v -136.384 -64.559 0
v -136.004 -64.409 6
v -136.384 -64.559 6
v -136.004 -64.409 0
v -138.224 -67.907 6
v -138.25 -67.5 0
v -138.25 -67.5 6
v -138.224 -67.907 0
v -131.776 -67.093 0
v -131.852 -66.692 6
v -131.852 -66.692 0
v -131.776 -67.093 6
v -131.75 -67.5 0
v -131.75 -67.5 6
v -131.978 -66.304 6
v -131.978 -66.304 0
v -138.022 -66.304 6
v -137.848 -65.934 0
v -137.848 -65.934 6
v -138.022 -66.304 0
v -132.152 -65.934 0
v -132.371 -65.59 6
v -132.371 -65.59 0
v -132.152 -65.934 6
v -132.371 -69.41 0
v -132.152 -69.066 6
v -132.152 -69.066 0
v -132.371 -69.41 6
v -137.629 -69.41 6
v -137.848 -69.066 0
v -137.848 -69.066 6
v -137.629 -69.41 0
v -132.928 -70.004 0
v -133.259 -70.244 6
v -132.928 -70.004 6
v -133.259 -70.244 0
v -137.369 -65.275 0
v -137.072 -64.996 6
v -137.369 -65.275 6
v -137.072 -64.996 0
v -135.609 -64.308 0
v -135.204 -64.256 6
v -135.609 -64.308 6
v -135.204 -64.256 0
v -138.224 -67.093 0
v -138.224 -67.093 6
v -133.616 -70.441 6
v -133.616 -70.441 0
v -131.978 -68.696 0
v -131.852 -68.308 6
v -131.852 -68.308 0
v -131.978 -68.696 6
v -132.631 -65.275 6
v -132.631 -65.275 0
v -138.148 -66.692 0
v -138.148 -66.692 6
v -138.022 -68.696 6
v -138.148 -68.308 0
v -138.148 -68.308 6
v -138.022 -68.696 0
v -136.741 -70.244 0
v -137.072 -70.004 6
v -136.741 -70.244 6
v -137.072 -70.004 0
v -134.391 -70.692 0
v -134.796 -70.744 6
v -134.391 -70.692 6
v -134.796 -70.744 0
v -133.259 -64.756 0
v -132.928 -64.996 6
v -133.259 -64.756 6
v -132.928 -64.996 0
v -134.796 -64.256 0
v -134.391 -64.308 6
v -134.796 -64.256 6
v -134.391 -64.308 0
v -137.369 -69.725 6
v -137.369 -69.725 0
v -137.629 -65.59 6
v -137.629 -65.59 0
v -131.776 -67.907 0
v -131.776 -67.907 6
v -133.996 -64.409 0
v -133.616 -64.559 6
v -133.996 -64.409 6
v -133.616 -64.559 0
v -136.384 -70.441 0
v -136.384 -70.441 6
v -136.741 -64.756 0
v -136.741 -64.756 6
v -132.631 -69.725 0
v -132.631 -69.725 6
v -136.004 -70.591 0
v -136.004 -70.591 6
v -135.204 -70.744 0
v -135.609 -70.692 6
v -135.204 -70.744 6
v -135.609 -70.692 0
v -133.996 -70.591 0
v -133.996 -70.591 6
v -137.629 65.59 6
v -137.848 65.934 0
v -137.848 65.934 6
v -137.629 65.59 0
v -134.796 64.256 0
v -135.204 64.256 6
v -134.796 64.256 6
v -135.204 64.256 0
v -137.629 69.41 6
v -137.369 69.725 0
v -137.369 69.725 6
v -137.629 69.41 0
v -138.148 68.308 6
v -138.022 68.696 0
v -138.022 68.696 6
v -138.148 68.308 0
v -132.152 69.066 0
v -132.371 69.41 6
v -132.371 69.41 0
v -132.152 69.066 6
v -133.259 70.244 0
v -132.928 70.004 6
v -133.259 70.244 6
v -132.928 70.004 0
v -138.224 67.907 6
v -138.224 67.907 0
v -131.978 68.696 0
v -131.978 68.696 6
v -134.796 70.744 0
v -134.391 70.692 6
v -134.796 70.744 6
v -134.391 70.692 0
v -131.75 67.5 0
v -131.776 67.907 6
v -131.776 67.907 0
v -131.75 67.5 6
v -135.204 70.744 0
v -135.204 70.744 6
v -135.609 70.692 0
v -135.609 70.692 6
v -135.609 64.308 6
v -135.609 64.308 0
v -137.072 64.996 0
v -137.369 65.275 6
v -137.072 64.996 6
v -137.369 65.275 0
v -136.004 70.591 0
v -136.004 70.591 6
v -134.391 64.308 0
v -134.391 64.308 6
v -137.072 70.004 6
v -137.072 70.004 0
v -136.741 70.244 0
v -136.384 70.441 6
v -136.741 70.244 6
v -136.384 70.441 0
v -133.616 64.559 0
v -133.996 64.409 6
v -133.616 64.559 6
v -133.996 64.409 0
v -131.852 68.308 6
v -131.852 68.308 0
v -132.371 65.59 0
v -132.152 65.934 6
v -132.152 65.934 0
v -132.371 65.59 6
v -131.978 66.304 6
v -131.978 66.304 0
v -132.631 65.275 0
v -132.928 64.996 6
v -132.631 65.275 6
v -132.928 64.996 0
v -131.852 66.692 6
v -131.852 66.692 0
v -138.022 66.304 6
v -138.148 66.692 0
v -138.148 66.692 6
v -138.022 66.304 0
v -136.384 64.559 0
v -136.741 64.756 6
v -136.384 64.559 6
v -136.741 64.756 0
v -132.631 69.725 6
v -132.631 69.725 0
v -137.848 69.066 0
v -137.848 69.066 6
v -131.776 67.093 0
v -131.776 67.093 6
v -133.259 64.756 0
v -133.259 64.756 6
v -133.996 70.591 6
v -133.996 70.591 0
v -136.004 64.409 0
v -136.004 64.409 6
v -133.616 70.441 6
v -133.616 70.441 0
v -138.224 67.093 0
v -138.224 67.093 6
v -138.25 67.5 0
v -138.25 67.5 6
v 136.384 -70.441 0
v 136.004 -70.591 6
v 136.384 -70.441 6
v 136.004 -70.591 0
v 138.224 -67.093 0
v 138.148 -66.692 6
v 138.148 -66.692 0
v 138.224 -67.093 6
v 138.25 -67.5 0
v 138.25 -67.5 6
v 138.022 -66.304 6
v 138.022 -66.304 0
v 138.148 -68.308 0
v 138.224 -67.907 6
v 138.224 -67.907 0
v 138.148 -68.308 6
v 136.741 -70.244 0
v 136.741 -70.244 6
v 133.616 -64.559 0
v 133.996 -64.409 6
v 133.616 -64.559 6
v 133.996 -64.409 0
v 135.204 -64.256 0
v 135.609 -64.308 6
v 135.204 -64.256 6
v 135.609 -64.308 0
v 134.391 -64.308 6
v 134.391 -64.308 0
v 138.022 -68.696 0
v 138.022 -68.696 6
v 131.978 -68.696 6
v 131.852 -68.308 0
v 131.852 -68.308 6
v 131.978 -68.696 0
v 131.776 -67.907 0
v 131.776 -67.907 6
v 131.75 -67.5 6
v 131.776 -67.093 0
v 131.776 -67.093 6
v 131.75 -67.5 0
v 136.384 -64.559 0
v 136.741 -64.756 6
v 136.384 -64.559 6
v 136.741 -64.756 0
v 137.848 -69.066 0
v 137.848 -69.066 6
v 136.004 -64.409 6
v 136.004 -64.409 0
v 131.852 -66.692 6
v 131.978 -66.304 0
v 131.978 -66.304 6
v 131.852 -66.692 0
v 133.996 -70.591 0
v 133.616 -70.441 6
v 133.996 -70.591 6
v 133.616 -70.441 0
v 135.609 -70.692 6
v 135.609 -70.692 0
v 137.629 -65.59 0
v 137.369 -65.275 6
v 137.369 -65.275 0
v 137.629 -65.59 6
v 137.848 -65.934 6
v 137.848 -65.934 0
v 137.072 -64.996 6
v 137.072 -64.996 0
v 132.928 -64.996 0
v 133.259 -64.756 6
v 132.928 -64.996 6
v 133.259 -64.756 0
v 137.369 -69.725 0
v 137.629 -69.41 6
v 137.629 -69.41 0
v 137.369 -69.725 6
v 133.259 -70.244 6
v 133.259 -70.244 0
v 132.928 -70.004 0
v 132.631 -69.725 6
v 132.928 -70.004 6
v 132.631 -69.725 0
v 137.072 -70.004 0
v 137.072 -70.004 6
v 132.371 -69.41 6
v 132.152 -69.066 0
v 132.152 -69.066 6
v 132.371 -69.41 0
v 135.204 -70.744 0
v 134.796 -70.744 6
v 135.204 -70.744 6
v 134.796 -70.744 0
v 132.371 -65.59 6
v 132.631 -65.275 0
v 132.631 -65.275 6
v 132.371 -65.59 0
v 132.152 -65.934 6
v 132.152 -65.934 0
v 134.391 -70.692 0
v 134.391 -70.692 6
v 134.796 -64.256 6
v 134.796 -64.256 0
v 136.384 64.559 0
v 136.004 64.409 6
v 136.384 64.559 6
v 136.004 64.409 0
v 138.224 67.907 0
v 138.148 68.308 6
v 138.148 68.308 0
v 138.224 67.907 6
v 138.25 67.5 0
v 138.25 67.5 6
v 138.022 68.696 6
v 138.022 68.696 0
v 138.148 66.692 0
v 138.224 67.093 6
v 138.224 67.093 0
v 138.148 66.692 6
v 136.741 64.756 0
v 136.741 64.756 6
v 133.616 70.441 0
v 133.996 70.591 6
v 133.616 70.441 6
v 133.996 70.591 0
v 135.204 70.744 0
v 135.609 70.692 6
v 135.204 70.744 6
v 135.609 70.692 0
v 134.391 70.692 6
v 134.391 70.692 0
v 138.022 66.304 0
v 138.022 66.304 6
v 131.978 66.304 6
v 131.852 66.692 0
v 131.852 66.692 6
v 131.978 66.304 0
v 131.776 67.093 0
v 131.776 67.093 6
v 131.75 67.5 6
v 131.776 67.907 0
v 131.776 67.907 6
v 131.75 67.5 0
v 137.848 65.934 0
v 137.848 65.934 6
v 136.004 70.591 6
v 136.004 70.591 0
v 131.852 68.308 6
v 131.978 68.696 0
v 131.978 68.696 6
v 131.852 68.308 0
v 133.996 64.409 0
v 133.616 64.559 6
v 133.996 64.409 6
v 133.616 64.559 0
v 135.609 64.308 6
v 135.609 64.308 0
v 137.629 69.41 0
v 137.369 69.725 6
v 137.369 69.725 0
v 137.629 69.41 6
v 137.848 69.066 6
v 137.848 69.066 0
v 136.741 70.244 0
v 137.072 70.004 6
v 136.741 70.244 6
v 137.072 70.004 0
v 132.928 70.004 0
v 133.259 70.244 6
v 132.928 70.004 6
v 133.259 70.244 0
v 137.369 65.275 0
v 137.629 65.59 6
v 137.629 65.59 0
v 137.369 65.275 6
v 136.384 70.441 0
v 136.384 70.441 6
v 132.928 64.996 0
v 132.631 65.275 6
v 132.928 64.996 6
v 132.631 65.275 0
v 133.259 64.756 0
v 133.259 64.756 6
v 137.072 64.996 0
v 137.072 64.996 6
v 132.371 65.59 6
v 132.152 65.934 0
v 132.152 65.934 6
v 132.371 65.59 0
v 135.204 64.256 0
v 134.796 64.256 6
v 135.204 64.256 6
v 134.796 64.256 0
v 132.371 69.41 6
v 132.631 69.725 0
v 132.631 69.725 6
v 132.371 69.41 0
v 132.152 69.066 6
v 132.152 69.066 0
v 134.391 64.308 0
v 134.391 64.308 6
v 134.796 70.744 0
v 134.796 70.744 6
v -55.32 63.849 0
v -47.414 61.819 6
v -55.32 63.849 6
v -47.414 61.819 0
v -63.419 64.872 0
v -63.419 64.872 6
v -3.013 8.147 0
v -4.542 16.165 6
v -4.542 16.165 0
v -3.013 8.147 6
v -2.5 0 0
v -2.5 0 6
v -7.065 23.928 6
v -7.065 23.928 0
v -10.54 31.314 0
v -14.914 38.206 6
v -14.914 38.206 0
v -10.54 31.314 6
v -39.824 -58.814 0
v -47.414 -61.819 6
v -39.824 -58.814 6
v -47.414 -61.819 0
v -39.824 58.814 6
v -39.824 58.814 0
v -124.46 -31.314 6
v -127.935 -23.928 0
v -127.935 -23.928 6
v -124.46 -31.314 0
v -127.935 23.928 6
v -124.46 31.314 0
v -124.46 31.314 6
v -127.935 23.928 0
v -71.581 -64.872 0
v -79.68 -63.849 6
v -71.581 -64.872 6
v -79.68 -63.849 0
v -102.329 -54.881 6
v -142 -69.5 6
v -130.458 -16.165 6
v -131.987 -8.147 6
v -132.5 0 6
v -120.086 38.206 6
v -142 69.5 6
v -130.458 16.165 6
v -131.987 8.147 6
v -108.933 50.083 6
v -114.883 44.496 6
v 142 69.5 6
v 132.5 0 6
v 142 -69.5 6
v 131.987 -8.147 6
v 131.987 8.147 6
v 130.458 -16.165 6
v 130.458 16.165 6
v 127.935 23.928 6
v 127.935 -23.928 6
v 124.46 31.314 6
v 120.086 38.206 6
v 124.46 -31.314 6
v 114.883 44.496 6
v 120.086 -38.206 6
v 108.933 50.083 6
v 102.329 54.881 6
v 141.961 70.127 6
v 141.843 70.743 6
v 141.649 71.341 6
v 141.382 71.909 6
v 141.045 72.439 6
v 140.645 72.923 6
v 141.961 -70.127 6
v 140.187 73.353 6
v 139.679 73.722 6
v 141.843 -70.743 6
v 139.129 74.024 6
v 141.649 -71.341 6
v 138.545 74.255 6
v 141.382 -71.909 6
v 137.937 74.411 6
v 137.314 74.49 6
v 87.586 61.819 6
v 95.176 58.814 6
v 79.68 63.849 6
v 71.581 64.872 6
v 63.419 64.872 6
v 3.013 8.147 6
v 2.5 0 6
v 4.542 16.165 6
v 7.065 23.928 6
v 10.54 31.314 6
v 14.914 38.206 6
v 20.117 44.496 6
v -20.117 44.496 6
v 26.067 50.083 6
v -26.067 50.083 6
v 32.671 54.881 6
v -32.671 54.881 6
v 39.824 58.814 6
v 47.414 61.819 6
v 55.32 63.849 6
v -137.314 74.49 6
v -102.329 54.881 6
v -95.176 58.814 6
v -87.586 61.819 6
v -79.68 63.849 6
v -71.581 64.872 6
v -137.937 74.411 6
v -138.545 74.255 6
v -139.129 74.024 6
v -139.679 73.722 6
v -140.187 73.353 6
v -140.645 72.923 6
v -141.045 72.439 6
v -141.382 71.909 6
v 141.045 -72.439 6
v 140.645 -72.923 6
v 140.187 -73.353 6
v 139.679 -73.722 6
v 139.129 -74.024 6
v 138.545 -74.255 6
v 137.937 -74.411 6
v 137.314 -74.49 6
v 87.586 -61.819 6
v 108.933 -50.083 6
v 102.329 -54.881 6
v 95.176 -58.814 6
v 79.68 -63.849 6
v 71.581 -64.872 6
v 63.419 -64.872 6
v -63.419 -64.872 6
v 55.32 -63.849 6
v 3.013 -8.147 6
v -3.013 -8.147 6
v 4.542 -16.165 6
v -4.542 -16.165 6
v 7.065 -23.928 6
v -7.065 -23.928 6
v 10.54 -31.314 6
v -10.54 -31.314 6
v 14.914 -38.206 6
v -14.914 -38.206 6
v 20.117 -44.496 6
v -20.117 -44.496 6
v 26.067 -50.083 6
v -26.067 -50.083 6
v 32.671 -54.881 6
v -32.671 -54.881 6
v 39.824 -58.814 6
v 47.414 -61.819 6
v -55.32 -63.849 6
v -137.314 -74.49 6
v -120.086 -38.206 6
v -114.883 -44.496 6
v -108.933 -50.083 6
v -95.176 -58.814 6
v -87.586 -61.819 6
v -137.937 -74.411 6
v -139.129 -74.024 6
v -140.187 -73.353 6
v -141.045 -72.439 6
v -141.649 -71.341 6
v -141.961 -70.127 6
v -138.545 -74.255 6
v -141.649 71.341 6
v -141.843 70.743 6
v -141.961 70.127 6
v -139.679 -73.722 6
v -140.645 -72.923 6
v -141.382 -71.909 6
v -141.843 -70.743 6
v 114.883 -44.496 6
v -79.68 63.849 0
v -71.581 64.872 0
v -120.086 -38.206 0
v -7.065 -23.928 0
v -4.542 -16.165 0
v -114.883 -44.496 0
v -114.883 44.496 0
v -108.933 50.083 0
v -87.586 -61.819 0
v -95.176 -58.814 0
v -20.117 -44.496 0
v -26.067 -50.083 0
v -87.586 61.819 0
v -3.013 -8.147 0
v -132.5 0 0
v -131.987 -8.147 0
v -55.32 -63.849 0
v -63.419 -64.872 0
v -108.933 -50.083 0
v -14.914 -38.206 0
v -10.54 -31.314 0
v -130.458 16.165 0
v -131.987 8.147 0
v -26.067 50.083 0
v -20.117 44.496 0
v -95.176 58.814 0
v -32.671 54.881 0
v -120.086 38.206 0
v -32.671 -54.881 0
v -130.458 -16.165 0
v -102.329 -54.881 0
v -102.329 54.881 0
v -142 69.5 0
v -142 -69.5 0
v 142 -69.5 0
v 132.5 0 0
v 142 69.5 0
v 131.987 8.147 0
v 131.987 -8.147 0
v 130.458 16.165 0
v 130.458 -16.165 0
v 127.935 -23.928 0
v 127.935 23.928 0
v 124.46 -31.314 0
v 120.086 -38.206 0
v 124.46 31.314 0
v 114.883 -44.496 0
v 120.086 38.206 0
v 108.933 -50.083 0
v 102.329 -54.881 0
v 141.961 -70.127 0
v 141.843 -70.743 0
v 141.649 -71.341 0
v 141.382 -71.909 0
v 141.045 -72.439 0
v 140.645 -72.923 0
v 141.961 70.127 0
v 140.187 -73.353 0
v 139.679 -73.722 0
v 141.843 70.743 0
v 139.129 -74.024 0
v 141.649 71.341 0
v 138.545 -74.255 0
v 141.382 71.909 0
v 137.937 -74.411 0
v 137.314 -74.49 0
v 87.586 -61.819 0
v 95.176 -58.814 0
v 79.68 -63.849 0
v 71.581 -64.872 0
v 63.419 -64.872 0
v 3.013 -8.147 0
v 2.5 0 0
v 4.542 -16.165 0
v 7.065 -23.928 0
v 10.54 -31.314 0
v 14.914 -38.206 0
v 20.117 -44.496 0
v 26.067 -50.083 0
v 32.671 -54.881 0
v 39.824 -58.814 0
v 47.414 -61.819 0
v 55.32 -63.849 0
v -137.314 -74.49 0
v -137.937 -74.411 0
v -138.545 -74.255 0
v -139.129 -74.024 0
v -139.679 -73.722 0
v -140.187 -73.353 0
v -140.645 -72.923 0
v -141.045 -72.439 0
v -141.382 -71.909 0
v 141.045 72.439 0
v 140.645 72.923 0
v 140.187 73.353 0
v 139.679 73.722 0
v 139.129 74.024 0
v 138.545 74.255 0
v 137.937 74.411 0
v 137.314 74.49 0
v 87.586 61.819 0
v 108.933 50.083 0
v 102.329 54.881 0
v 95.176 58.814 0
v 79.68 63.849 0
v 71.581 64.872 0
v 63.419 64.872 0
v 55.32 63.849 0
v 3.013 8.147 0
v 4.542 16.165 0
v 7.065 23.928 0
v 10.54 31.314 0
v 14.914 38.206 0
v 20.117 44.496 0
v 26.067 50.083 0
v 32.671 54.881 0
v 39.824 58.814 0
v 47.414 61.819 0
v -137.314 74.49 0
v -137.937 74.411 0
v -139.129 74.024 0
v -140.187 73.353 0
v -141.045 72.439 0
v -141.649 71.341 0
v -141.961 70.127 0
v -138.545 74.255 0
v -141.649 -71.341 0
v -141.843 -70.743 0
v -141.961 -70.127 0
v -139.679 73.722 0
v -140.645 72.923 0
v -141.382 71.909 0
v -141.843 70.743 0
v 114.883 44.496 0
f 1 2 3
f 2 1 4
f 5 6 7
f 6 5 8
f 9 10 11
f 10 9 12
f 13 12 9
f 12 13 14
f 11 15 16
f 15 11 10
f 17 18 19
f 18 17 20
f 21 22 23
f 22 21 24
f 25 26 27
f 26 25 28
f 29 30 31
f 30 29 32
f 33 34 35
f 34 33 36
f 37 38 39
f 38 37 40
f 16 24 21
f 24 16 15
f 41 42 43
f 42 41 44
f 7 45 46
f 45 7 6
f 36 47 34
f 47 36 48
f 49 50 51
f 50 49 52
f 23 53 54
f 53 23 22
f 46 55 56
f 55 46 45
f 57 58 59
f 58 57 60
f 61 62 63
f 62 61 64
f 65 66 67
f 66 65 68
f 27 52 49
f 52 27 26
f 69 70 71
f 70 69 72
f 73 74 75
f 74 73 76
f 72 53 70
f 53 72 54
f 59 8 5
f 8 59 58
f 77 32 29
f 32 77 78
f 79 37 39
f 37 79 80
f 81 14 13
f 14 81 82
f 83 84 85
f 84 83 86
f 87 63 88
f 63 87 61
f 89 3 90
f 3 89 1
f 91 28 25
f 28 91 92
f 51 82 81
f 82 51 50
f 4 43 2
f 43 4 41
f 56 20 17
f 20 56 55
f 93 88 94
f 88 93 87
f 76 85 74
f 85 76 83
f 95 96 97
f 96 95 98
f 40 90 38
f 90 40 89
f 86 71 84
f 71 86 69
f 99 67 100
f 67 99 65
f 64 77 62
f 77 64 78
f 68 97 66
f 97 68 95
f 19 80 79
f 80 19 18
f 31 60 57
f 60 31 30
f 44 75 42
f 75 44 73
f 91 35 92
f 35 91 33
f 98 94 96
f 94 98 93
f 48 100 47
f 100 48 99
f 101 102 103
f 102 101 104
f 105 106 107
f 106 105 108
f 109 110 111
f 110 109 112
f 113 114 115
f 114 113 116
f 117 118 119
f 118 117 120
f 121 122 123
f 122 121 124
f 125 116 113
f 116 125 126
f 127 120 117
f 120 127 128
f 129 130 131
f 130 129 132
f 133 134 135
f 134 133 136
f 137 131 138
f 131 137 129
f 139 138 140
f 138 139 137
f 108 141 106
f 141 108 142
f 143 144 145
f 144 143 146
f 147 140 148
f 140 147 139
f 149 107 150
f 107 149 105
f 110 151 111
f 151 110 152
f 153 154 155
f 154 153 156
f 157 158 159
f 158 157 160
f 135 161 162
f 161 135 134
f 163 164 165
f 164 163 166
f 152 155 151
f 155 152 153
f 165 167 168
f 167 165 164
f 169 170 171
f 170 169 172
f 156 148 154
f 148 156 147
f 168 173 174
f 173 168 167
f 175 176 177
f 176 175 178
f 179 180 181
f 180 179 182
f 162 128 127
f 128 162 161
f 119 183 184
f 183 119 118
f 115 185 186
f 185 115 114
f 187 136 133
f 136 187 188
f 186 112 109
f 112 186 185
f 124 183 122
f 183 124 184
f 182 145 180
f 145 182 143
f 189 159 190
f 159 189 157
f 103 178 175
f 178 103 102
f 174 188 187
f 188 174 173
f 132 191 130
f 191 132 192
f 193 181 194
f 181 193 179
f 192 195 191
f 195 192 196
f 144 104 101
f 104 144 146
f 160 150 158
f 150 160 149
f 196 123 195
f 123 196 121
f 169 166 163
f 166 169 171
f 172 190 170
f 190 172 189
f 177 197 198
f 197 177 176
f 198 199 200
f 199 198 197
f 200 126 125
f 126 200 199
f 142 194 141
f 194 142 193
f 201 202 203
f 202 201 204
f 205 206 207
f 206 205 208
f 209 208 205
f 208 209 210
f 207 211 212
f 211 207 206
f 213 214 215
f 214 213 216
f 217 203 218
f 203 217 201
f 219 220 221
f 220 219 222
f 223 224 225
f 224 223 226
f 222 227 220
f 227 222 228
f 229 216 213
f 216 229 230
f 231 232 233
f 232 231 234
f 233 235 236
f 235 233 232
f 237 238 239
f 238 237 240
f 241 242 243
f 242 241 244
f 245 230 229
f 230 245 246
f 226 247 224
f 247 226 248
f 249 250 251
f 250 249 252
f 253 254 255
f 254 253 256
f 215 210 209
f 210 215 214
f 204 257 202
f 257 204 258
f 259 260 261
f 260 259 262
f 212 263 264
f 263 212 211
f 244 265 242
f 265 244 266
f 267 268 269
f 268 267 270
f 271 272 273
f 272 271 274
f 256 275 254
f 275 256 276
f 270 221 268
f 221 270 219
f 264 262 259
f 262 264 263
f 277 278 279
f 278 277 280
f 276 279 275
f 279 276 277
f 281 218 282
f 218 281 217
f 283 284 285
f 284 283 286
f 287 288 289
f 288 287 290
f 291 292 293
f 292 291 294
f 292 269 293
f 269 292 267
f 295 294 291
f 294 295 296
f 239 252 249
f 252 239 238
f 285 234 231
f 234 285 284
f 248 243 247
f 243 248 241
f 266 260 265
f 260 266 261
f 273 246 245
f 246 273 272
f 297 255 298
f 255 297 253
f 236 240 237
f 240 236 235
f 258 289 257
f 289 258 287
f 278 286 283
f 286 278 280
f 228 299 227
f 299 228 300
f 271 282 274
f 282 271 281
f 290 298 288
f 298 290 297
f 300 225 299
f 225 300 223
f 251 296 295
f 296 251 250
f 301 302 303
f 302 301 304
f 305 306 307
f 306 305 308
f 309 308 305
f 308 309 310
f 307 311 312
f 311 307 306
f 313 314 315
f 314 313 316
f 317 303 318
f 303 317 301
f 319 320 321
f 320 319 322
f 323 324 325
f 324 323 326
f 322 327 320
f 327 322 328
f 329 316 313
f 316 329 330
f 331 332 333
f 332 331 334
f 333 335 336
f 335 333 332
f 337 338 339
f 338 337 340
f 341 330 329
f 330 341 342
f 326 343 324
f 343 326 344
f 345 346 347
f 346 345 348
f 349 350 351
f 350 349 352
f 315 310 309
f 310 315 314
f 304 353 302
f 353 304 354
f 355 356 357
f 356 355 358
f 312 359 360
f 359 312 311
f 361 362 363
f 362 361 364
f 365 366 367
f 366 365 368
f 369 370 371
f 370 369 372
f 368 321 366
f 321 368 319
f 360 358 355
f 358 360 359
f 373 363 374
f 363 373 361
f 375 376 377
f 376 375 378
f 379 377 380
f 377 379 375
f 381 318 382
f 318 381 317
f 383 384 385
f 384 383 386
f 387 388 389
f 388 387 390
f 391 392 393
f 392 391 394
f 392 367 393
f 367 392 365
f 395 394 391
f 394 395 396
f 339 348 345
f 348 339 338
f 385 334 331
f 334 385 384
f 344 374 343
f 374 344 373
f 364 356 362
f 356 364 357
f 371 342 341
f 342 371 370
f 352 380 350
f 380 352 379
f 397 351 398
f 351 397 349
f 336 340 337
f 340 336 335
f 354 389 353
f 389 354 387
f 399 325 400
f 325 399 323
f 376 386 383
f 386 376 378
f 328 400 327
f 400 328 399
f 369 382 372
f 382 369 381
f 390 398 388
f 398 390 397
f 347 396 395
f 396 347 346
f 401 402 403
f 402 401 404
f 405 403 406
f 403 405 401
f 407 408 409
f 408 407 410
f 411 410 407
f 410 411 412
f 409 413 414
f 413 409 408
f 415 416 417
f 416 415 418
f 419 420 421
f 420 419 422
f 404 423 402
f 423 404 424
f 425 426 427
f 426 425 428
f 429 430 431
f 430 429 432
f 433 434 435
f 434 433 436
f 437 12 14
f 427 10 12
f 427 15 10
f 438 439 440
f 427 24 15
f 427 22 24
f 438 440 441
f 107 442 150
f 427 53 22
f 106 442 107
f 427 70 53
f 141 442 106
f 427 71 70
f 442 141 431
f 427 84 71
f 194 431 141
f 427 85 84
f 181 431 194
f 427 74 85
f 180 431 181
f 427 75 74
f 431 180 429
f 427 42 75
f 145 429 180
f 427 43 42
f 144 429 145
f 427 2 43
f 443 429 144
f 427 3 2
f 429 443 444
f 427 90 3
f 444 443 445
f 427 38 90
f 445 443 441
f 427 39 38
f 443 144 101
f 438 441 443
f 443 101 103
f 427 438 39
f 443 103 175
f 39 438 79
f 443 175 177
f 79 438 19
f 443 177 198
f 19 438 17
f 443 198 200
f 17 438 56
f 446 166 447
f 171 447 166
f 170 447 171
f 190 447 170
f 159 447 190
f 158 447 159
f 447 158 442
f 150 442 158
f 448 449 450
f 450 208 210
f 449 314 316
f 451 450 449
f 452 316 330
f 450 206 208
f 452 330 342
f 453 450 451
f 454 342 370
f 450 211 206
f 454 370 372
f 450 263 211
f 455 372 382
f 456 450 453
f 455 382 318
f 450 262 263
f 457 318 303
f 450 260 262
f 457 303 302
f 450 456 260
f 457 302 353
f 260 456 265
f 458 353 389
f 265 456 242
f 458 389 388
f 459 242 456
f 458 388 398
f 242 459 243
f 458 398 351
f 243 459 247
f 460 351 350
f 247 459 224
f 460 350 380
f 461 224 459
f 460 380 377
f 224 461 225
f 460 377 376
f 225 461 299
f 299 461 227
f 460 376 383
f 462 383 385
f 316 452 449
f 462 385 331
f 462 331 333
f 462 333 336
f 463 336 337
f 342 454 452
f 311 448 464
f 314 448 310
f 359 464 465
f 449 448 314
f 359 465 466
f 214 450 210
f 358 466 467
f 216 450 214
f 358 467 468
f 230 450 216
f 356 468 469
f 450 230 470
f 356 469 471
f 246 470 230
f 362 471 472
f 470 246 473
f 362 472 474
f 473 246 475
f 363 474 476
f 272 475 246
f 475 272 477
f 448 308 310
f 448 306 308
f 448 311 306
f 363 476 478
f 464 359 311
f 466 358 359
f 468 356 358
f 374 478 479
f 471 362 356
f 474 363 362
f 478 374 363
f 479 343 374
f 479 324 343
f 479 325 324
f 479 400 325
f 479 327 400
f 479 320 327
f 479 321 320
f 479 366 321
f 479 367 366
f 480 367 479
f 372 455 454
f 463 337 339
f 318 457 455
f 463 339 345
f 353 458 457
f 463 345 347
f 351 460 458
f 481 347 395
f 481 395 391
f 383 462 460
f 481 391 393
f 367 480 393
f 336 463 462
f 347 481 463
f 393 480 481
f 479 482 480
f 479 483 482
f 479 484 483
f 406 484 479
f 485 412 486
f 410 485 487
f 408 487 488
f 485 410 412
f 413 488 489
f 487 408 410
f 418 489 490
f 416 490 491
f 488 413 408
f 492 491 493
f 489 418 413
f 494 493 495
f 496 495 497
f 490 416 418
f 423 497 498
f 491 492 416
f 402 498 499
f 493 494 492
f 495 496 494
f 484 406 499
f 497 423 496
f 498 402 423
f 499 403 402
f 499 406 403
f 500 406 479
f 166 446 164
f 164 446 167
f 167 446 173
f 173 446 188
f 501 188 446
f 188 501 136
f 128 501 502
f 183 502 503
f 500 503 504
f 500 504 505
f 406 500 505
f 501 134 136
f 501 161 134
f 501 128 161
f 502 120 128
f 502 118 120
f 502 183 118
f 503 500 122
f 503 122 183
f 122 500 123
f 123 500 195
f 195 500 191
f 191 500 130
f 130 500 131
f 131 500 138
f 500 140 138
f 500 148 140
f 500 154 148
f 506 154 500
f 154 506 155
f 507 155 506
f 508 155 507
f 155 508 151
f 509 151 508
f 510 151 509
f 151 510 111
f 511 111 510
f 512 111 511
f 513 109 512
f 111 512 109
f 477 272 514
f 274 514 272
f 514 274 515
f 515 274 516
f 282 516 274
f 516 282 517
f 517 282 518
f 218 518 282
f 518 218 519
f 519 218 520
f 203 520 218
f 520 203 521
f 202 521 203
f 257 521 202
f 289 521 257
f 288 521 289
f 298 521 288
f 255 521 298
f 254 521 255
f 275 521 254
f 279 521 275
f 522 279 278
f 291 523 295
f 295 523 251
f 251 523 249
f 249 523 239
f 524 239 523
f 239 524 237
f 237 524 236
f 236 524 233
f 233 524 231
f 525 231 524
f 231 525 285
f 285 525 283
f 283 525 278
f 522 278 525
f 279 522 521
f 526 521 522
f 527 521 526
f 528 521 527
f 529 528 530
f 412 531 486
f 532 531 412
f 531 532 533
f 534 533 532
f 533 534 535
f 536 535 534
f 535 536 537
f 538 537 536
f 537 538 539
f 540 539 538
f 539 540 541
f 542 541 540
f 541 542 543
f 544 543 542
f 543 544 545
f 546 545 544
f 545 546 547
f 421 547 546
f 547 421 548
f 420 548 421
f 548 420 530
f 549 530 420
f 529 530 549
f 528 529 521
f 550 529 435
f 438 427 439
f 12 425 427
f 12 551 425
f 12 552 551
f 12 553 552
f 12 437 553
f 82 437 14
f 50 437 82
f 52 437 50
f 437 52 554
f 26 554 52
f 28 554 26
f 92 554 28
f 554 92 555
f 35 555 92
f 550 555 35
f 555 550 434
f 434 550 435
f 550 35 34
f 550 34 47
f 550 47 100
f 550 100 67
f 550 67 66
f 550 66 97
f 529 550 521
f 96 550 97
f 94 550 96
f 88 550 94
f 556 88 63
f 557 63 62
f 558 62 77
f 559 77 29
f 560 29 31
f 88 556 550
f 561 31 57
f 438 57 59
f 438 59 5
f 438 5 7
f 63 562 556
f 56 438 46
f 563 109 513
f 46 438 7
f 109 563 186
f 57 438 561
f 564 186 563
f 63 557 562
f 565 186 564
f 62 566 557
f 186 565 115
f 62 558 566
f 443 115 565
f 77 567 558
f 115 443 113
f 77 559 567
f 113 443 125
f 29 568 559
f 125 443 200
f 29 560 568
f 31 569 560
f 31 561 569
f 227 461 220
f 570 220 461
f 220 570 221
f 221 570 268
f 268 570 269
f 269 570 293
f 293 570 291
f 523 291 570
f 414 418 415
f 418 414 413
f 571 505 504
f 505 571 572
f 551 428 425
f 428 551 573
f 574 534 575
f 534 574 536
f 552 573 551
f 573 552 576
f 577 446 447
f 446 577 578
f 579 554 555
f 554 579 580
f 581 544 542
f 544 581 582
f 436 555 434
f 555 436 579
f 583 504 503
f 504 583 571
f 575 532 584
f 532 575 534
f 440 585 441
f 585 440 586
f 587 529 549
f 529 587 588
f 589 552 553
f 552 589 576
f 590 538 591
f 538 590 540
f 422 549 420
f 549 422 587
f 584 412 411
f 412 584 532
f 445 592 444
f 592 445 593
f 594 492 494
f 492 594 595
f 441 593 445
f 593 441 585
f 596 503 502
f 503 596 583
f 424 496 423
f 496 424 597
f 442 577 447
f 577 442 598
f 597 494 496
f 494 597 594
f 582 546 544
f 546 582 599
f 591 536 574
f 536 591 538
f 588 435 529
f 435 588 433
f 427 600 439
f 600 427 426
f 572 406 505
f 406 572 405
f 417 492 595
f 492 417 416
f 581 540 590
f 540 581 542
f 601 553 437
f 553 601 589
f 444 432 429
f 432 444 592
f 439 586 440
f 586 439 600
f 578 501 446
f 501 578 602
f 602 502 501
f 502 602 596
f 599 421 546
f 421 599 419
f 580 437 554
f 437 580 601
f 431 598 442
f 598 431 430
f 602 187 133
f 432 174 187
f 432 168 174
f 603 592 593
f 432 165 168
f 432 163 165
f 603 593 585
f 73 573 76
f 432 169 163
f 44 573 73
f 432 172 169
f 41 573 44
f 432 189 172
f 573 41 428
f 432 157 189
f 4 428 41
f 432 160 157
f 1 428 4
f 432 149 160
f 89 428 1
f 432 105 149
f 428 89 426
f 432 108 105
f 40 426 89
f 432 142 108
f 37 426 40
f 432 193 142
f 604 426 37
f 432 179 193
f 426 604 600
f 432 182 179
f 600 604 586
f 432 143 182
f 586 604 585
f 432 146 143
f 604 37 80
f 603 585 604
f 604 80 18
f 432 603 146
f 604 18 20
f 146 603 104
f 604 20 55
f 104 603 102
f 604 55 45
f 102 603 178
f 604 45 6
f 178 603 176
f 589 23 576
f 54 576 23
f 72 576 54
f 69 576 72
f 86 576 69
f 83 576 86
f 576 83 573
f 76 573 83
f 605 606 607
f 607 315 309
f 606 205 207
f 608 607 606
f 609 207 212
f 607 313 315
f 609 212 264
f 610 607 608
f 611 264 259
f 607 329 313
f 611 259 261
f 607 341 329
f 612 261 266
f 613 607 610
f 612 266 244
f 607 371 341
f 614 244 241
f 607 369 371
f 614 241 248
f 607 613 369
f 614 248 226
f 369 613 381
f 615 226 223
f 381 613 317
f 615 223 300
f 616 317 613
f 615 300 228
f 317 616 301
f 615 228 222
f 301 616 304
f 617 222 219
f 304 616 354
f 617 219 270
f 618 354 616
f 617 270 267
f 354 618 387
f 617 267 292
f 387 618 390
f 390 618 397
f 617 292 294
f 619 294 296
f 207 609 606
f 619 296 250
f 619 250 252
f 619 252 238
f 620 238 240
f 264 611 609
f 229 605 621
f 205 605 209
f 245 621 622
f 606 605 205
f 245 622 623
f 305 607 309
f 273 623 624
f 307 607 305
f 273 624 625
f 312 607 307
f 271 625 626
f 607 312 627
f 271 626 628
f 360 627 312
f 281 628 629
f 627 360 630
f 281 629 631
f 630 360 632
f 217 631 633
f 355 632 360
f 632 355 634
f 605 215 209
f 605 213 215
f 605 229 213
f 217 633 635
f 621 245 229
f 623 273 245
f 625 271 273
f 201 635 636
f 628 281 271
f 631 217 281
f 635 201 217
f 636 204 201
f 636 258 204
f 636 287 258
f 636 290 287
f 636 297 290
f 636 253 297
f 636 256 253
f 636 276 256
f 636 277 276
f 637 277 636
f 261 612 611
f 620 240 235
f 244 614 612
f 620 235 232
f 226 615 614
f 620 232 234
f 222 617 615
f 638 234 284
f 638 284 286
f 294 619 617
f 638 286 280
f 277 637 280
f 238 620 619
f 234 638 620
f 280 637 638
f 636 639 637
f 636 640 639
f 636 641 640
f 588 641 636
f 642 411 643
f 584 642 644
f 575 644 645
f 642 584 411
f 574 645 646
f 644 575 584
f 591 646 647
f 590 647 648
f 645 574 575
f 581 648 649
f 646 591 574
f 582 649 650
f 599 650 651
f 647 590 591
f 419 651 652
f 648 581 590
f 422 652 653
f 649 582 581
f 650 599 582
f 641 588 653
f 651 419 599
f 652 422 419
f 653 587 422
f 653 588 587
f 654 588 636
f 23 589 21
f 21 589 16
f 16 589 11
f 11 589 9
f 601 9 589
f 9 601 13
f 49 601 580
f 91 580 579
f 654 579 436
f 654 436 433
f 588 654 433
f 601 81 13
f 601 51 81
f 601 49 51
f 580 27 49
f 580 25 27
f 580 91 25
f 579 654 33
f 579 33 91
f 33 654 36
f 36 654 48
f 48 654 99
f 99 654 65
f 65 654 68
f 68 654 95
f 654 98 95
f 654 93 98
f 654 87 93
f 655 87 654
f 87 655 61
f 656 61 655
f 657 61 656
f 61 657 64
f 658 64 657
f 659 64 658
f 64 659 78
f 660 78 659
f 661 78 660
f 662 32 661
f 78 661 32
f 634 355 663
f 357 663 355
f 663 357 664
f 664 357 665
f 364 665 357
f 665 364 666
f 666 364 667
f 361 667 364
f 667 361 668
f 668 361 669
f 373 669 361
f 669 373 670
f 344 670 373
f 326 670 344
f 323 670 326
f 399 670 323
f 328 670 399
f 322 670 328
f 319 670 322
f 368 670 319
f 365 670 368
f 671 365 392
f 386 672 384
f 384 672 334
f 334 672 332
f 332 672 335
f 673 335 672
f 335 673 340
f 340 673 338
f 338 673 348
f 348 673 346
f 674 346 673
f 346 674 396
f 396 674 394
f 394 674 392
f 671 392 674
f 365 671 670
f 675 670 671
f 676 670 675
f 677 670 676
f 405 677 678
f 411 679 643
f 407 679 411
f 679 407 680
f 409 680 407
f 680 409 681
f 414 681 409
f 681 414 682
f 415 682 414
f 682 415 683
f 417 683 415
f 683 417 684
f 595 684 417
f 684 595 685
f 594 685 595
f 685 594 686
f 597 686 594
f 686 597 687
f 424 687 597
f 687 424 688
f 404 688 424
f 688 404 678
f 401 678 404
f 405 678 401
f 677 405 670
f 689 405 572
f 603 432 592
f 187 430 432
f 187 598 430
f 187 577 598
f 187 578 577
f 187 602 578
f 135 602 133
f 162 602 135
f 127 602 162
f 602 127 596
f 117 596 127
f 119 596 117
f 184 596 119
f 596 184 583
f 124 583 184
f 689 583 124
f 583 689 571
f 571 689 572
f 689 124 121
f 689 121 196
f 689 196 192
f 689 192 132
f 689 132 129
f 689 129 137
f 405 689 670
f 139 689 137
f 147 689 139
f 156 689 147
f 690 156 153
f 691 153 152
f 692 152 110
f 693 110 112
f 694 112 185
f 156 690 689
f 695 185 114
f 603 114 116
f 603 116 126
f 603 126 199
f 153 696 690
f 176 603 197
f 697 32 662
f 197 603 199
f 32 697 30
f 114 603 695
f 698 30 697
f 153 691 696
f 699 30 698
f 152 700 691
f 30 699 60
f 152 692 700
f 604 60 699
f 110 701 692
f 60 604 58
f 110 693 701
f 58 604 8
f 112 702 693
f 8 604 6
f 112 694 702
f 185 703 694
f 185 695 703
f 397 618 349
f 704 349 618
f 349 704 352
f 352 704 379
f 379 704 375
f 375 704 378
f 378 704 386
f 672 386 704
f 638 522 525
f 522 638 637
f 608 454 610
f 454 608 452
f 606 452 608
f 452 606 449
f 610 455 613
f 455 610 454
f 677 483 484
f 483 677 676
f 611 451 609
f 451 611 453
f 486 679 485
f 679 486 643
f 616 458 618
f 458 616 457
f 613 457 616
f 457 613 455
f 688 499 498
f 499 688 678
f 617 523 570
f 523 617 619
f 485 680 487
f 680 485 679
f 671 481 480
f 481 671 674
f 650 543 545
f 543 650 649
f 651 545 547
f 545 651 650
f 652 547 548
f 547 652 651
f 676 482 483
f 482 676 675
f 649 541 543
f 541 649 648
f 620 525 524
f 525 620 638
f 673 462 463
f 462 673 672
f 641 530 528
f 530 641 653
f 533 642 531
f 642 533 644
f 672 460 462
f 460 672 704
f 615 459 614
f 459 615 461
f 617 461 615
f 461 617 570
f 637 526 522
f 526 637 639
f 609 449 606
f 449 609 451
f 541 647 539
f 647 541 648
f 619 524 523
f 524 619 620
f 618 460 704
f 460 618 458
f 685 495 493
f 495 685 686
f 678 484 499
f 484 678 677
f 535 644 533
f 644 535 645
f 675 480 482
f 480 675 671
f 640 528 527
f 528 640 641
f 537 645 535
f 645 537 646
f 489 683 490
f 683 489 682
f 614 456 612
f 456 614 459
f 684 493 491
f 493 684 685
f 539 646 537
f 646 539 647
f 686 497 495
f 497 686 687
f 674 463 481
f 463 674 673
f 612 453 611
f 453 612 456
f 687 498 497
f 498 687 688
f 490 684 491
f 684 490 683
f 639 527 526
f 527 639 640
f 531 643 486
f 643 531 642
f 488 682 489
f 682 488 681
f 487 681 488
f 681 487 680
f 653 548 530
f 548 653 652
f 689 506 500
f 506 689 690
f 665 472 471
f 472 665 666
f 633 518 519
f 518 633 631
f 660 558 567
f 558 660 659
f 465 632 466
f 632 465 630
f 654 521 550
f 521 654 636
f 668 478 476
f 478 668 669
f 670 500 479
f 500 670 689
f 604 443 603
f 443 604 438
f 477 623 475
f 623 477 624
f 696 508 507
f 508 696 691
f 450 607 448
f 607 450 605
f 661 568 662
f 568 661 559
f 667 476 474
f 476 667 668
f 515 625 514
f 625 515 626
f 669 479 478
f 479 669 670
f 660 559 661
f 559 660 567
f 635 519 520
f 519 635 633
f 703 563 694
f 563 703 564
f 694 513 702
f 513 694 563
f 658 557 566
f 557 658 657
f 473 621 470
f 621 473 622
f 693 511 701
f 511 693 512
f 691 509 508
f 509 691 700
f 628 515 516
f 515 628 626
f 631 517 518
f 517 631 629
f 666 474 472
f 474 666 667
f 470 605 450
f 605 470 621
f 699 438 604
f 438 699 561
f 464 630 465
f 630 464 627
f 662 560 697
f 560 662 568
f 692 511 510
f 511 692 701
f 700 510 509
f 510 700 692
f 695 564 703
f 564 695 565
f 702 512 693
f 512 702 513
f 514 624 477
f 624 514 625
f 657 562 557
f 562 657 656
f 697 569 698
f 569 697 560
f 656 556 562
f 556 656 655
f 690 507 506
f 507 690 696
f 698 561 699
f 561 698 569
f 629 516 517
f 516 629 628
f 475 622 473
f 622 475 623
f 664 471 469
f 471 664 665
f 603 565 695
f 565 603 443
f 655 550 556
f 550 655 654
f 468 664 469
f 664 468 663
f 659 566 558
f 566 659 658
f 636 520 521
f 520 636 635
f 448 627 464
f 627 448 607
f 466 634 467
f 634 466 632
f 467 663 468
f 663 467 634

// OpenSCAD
$fn = 50;


difference() {
	union() {
		hull() {
			translate(v = [-137.0000000000, 69.5000000000, 0]) {
				cylinder(h = 6, r = 5);
			}
			translate(v = [137.0000000000, 69.5000000000, 0]) {
				cylinder(h = 6, r = 5);
			}
			translate(v = [-137.0000000000, -69.5000000000, 0]) {
				cylinder(h = 6, r = 5);
			}
			translate(v = [137.0000000000, -69.5000000000, 0]) {
				cylinder(h = 6, r = 5);
			}
		}
	}
	union() {
		#translate(v = [-135.0000000000, -67.5000000000, -100.0000000000]) {
			cylinder(h = 200, r = 3.2500000000);
		}
		#translate(v = [-135.0000000000, 67.5000000000, -100.0000000000]) {
			cylinder(h = 200, r = 3.2500000000);
		}
		#translate(v = [135.0000000000, -67.5000000000, -100.0000000000]) {
			cylinder(h = 200, r = 3.2500000000);
		}
		#translate(v = [135.0000000000, 67.5000000000, -100.0000000000]) {
			cylinder(h = 200, r = 3.2500000000);
		}
		#translate(v = [-67.5000000000, 0, 0]) {
			cylinder(h = 6, r = 65.0000000000);
		}
		#translate(v = [67.5000000000, 0, 0]) {
			cylinder(h = 6, r = 65.0000000000);
		}
	}
}
